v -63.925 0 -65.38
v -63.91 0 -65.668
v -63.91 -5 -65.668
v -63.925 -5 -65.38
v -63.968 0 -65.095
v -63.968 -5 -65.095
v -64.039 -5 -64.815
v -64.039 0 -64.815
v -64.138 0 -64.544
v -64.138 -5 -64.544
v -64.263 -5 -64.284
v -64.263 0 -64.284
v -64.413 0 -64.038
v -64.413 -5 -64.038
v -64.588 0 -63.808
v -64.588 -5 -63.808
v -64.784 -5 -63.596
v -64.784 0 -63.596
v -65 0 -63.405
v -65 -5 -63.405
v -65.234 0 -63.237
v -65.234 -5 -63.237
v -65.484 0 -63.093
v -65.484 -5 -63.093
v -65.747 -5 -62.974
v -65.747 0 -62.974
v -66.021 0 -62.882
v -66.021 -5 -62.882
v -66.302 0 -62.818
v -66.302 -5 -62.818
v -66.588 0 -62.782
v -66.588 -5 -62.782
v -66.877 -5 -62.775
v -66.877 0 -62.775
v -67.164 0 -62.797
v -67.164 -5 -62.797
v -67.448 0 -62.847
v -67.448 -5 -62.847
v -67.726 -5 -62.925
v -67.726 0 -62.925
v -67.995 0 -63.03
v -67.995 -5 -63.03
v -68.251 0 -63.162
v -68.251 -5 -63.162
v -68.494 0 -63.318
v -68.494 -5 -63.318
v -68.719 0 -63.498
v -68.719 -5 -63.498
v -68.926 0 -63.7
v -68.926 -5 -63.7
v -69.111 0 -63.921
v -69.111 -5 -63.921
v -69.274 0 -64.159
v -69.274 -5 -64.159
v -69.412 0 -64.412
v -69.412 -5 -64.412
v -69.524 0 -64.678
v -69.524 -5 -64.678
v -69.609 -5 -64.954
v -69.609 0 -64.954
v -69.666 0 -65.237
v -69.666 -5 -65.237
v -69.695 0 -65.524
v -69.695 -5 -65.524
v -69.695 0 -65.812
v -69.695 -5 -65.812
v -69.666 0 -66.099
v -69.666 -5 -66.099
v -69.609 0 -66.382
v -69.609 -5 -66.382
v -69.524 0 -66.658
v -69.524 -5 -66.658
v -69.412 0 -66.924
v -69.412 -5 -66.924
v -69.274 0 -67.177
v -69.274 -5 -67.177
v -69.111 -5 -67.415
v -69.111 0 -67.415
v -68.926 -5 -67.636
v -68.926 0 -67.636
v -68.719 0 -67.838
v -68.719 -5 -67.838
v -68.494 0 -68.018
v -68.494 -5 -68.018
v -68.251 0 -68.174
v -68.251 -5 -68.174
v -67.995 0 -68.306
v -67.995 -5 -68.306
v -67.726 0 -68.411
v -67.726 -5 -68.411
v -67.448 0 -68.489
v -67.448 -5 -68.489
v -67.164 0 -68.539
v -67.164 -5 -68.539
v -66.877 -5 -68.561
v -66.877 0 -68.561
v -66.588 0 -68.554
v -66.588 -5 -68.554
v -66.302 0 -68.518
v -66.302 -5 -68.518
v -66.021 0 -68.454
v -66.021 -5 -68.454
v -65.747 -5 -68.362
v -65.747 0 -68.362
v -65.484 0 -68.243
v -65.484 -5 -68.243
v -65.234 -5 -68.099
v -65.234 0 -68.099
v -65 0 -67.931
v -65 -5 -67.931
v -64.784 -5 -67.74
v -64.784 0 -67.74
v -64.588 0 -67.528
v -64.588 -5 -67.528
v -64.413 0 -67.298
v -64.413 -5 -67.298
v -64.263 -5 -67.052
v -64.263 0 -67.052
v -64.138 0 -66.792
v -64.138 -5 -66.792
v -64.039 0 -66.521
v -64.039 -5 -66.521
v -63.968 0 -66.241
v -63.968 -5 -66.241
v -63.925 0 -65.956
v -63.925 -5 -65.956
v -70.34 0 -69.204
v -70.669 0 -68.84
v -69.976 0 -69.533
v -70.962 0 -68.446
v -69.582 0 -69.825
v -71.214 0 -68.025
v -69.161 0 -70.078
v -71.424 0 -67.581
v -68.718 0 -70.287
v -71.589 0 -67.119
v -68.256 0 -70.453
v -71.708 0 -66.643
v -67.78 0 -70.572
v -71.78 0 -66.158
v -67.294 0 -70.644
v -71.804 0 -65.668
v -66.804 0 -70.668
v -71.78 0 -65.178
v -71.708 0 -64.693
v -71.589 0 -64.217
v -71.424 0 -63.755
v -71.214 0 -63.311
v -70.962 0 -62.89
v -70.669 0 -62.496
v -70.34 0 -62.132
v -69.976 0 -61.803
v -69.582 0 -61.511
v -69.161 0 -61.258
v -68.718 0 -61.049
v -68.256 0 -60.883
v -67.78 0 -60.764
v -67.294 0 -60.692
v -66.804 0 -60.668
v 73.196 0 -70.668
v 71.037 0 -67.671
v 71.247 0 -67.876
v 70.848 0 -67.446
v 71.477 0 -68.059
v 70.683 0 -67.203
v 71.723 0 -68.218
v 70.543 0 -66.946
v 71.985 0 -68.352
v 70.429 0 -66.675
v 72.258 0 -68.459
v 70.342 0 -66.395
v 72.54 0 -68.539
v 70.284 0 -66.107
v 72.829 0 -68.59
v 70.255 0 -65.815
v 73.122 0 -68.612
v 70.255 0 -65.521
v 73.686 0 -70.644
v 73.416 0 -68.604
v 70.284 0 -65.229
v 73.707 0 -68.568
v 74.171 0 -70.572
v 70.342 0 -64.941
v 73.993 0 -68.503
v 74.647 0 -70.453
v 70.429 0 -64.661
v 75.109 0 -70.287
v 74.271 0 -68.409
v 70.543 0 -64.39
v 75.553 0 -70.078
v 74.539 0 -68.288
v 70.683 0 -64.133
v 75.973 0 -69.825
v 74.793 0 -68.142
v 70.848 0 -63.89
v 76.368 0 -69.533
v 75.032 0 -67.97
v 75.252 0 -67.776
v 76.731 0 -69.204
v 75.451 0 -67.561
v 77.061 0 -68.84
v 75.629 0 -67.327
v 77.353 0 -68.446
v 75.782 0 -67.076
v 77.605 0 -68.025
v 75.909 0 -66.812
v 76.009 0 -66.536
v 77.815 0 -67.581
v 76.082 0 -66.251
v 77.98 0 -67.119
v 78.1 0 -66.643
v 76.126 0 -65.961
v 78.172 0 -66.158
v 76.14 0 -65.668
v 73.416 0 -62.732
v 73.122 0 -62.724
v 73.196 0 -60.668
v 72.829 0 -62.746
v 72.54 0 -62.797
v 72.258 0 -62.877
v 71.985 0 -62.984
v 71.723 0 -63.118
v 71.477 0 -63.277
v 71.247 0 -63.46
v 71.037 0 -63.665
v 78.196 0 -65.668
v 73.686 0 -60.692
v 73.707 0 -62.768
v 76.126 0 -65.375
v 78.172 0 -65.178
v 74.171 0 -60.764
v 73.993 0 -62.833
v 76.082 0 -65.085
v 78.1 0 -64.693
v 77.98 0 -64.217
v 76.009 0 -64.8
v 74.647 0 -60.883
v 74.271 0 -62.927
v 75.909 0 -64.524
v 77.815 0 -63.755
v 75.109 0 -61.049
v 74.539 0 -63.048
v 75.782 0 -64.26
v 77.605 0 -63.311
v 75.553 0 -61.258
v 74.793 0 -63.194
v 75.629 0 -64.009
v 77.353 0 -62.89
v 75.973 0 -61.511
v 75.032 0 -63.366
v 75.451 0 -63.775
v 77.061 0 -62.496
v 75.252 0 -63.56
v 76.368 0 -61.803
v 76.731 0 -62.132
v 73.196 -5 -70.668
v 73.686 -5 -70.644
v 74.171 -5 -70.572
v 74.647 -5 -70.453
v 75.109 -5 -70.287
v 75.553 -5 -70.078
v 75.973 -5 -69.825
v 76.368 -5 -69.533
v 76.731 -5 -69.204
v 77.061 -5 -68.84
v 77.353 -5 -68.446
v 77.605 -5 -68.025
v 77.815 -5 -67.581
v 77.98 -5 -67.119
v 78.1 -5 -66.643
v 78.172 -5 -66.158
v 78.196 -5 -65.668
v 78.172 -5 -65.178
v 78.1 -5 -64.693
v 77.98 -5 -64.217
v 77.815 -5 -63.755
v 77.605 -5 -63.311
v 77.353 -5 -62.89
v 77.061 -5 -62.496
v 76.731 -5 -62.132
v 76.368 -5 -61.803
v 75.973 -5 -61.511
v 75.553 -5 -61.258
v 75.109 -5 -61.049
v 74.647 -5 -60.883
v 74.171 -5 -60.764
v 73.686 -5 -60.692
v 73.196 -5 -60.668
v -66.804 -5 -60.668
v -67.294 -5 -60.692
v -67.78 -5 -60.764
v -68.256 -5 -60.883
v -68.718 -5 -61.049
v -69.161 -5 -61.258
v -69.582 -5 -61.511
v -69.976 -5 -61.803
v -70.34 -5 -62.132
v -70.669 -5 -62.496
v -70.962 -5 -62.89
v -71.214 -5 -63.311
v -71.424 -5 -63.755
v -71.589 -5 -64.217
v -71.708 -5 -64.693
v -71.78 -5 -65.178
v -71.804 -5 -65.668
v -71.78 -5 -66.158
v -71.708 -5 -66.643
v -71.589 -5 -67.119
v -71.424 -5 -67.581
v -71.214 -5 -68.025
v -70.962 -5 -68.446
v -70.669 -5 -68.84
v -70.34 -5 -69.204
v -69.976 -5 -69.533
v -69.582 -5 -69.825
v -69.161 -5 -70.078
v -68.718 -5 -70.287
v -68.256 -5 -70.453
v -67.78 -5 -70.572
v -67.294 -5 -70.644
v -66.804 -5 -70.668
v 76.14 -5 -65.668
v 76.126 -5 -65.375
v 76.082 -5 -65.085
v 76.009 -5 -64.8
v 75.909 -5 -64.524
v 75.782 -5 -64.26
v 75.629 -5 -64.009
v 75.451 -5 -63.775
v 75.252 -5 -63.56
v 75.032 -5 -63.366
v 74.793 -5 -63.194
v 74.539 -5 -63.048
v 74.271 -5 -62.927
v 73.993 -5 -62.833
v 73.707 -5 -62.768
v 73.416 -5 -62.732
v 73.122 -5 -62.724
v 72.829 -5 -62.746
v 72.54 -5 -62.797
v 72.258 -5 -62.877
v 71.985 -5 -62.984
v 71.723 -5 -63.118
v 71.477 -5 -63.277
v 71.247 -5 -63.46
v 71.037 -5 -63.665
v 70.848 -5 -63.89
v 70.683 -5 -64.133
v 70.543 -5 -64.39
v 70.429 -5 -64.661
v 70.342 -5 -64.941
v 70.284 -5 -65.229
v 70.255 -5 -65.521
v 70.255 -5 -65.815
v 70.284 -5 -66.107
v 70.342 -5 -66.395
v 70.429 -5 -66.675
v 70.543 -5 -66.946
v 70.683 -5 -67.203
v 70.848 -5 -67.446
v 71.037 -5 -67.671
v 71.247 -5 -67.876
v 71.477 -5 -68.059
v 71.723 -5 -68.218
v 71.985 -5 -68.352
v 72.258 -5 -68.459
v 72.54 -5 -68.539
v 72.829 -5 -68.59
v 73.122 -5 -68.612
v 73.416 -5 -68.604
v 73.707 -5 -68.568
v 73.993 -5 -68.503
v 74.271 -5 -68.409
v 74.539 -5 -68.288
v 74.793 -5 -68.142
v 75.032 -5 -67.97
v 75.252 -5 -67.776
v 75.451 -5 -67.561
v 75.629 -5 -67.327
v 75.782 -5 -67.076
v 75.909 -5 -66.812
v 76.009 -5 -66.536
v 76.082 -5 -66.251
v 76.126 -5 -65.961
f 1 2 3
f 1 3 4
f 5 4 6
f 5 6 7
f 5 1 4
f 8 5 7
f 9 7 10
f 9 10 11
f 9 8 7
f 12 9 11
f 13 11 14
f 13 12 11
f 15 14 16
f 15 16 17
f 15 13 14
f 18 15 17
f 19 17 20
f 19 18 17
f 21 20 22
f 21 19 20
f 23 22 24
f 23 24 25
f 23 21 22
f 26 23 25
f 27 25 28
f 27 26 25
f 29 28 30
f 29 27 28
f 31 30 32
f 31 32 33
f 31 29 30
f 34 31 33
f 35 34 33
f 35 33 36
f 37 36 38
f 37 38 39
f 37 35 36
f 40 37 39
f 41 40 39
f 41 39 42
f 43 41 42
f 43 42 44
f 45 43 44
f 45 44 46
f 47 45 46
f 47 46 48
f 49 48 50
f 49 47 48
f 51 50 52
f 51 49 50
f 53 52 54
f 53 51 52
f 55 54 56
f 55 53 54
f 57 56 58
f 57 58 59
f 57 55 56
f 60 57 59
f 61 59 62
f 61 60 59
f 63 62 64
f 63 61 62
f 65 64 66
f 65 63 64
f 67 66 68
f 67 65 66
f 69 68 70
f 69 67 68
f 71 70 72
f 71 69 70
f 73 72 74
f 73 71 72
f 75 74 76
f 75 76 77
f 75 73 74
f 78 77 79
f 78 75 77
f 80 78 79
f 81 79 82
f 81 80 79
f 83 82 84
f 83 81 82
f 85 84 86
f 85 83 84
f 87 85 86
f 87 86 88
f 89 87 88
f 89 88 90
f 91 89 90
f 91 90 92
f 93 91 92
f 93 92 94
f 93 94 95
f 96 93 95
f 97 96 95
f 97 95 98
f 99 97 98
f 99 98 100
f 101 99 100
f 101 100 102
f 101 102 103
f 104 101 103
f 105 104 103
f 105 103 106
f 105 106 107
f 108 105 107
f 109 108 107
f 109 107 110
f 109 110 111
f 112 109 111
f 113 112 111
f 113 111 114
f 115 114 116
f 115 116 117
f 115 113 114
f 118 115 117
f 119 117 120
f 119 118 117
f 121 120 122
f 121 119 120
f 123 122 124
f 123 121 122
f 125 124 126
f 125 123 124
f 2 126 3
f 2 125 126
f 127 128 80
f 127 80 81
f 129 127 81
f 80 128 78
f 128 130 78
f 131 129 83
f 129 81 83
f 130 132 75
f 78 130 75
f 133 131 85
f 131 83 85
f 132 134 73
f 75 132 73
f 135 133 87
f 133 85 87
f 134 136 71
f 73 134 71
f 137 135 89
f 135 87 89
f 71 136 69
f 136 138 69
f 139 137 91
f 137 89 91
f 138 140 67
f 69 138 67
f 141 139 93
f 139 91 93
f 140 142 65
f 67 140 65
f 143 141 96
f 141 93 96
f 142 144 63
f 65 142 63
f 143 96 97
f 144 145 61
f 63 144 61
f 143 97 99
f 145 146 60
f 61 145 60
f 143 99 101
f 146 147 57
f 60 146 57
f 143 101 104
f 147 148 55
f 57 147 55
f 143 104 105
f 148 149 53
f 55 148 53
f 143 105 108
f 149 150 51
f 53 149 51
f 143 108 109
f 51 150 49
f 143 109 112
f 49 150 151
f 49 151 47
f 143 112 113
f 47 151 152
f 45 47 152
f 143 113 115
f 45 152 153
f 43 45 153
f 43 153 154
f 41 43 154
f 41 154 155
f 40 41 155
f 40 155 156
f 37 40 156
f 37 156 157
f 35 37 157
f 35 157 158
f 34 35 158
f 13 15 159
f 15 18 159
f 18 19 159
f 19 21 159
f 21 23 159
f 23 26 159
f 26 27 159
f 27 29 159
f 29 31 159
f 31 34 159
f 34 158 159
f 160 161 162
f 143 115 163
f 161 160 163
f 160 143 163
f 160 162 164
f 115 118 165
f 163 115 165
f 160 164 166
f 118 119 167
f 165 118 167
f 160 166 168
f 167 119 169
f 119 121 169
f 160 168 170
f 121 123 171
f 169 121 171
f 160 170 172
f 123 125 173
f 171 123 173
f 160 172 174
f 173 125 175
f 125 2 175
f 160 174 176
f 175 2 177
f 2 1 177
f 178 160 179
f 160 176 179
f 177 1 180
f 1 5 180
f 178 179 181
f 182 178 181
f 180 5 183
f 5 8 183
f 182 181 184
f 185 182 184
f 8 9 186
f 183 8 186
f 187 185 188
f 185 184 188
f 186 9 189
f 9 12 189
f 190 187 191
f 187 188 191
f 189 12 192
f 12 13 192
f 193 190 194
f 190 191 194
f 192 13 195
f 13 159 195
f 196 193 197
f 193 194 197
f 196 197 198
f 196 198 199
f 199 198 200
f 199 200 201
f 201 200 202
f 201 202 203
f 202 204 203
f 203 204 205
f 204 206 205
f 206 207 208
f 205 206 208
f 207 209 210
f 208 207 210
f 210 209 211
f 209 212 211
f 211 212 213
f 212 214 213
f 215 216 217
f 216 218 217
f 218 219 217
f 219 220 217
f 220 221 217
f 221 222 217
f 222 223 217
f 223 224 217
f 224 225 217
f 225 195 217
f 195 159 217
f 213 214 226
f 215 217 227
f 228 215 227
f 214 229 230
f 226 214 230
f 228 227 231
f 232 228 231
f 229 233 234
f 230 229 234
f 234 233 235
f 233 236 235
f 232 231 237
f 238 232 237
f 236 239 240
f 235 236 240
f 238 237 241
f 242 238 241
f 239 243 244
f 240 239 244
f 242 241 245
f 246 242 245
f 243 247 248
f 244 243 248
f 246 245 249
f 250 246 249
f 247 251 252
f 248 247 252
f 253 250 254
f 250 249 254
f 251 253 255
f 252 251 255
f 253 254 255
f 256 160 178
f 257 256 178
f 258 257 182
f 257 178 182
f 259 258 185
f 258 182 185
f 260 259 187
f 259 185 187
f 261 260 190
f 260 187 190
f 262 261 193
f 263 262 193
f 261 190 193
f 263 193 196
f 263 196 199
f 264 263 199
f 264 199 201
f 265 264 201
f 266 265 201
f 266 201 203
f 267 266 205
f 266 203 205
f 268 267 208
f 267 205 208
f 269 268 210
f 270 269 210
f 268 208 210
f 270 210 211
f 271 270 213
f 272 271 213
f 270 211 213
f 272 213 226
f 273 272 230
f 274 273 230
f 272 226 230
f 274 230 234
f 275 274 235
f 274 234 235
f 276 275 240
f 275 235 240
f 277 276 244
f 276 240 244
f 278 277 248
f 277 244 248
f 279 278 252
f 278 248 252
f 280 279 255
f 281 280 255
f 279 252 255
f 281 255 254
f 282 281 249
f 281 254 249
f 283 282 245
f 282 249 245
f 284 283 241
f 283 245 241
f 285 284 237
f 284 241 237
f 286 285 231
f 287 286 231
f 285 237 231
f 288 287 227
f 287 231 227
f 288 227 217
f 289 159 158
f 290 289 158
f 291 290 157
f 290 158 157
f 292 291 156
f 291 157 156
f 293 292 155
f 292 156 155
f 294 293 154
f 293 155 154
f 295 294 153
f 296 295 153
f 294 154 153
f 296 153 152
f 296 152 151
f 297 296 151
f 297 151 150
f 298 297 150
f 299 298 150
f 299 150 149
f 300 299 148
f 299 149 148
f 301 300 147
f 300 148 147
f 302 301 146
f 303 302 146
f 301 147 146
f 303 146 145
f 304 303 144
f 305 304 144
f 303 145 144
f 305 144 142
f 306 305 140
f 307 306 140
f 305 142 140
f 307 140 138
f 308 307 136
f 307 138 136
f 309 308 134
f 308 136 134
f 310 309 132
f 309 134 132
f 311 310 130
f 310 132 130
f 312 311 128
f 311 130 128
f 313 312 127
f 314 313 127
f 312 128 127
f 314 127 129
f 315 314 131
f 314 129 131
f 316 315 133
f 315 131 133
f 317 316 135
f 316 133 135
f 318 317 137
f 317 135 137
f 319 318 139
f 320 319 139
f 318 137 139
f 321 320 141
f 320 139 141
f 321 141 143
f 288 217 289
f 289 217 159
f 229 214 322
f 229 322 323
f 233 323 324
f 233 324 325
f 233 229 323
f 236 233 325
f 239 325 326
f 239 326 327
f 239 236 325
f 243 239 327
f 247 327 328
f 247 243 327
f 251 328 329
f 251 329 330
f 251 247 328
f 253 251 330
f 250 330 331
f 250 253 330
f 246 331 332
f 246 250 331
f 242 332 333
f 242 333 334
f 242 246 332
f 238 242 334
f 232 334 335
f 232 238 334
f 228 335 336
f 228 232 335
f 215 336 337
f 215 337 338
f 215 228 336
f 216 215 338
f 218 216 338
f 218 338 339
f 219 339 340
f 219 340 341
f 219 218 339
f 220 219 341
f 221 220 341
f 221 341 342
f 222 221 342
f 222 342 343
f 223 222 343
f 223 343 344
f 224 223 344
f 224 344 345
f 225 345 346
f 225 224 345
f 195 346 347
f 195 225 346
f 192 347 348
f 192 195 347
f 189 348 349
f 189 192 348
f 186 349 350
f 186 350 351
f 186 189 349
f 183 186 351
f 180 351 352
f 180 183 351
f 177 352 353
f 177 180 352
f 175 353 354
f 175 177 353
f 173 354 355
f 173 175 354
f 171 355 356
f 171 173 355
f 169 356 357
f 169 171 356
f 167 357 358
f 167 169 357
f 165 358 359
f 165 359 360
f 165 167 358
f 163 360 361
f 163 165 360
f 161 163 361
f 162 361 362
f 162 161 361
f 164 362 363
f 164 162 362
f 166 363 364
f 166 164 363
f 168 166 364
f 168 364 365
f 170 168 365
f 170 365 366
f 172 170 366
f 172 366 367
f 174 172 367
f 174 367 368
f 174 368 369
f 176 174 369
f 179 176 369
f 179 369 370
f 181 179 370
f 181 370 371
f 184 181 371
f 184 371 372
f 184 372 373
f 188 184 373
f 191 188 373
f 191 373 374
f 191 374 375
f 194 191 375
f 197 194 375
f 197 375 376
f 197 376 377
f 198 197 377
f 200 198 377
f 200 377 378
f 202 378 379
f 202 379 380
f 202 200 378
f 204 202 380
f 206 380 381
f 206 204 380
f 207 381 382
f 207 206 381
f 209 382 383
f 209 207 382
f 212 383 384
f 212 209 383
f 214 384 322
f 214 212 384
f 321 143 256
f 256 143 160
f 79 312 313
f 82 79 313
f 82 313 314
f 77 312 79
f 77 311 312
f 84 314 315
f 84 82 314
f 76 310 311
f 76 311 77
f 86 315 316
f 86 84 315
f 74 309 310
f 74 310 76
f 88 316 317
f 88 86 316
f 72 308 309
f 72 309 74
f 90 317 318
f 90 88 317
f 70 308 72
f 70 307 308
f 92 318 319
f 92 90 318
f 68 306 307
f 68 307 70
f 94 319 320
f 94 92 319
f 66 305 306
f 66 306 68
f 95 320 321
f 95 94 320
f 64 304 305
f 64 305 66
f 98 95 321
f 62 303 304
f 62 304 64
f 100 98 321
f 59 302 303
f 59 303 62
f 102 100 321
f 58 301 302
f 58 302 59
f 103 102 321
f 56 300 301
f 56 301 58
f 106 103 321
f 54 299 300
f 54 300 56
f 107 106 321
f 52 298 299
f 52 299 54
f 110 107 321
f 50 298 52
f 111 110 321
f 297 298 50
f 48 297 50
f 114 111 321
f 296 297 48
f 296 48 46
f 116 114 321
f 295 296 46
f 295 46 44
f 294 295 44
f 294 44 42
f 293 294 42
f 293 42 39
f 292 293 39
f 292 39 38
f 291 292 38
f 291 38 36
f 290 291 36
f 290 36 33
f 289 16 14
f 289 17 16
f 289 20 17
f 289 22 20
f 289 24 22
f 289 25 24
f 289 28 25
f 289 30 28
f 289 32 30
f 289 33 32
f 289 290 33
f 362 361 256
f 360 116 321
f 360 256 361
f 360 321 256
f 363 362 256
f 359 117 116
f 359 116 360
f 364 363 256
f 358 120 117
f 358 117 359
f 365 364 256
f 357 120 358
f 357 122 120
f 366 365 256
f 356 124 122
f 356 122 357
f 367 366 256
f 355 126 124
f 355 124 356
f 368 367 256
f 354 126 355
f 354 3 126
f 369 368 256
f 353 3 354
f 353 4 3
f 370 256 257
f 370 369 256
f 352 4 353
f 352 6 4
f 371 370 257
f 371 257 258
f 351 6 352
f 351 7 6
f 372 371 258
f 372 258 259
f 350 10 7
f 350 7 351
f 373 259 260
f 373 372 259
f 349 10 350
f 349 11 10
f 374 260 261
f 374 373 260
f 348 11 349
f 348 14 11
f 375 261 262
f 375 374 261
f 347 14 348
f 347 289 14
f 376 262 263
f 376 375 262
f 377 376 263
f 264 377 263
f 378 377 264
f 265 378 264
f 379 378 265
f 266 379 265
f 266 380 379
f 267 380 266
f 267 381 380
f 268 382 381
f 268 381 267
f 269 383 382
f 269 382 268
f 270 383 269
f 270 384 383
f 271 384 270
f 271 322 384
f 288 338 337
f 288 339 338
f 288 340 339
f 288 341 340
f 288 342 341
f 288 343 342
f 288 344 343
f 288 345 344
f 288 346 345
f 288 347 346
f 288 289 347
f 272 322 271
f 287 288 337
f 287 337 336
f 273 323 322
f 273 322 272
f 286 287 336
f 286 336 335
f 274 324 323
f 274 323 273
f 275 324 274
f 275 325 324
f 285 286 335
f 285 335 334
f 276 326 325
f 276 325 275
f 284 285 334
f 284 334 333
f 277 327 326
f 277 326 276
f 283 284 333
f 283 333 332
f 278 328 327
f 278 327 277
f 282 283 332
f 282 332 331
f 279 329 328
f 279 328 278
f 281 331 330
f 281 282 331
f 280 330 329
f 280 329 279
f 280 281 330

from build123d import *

# Parameters (mm, degrees)
F0_R     = 2.893868
F0_R_2   = 2.944641
F1_DEPTH = 5
F2_R     = 6.542649
F3_DEPTH = 150


with BuildPart() as f1:
    # F0 (on Front) → F1 (new body)
    with BuildSketch(Plane.XZ):
        with BuildLine():
            ThreePointArc((-66.804364, -60.668005), (-71.804364, -65.668005), (-66.804364, -70.668005))
            Line((-66.804364, -70.668005), (73.195636, -70.668005))
            ThreePointArc((73.195636, -70.668005), (78.195636, -65.668005), (73.195636, -60.668005))
            Line((73.195636, -60.668005), (-66.804364, -60.668005))
        make_face()
        with Locations((-66.804364, -65.668005)):
            Circle(F0_R, mode=Mode.SUBTRACT)
        with Locations((73.195636, -65.668005)):
            Circle(F0_R_2, mode=Mode.SUBTRACT)
    extrude(amount=F1_DEPTH)


with BuildPart() as f3:
    # F2 (on Front) → F3 (new body)
    with BuildSketch(Plane.XZ):
        with Locations((-51.154699, 6.320113)):
            Circle(F2_R)
    extrude(amount=F3_DEPTH)


solid = f1.part
